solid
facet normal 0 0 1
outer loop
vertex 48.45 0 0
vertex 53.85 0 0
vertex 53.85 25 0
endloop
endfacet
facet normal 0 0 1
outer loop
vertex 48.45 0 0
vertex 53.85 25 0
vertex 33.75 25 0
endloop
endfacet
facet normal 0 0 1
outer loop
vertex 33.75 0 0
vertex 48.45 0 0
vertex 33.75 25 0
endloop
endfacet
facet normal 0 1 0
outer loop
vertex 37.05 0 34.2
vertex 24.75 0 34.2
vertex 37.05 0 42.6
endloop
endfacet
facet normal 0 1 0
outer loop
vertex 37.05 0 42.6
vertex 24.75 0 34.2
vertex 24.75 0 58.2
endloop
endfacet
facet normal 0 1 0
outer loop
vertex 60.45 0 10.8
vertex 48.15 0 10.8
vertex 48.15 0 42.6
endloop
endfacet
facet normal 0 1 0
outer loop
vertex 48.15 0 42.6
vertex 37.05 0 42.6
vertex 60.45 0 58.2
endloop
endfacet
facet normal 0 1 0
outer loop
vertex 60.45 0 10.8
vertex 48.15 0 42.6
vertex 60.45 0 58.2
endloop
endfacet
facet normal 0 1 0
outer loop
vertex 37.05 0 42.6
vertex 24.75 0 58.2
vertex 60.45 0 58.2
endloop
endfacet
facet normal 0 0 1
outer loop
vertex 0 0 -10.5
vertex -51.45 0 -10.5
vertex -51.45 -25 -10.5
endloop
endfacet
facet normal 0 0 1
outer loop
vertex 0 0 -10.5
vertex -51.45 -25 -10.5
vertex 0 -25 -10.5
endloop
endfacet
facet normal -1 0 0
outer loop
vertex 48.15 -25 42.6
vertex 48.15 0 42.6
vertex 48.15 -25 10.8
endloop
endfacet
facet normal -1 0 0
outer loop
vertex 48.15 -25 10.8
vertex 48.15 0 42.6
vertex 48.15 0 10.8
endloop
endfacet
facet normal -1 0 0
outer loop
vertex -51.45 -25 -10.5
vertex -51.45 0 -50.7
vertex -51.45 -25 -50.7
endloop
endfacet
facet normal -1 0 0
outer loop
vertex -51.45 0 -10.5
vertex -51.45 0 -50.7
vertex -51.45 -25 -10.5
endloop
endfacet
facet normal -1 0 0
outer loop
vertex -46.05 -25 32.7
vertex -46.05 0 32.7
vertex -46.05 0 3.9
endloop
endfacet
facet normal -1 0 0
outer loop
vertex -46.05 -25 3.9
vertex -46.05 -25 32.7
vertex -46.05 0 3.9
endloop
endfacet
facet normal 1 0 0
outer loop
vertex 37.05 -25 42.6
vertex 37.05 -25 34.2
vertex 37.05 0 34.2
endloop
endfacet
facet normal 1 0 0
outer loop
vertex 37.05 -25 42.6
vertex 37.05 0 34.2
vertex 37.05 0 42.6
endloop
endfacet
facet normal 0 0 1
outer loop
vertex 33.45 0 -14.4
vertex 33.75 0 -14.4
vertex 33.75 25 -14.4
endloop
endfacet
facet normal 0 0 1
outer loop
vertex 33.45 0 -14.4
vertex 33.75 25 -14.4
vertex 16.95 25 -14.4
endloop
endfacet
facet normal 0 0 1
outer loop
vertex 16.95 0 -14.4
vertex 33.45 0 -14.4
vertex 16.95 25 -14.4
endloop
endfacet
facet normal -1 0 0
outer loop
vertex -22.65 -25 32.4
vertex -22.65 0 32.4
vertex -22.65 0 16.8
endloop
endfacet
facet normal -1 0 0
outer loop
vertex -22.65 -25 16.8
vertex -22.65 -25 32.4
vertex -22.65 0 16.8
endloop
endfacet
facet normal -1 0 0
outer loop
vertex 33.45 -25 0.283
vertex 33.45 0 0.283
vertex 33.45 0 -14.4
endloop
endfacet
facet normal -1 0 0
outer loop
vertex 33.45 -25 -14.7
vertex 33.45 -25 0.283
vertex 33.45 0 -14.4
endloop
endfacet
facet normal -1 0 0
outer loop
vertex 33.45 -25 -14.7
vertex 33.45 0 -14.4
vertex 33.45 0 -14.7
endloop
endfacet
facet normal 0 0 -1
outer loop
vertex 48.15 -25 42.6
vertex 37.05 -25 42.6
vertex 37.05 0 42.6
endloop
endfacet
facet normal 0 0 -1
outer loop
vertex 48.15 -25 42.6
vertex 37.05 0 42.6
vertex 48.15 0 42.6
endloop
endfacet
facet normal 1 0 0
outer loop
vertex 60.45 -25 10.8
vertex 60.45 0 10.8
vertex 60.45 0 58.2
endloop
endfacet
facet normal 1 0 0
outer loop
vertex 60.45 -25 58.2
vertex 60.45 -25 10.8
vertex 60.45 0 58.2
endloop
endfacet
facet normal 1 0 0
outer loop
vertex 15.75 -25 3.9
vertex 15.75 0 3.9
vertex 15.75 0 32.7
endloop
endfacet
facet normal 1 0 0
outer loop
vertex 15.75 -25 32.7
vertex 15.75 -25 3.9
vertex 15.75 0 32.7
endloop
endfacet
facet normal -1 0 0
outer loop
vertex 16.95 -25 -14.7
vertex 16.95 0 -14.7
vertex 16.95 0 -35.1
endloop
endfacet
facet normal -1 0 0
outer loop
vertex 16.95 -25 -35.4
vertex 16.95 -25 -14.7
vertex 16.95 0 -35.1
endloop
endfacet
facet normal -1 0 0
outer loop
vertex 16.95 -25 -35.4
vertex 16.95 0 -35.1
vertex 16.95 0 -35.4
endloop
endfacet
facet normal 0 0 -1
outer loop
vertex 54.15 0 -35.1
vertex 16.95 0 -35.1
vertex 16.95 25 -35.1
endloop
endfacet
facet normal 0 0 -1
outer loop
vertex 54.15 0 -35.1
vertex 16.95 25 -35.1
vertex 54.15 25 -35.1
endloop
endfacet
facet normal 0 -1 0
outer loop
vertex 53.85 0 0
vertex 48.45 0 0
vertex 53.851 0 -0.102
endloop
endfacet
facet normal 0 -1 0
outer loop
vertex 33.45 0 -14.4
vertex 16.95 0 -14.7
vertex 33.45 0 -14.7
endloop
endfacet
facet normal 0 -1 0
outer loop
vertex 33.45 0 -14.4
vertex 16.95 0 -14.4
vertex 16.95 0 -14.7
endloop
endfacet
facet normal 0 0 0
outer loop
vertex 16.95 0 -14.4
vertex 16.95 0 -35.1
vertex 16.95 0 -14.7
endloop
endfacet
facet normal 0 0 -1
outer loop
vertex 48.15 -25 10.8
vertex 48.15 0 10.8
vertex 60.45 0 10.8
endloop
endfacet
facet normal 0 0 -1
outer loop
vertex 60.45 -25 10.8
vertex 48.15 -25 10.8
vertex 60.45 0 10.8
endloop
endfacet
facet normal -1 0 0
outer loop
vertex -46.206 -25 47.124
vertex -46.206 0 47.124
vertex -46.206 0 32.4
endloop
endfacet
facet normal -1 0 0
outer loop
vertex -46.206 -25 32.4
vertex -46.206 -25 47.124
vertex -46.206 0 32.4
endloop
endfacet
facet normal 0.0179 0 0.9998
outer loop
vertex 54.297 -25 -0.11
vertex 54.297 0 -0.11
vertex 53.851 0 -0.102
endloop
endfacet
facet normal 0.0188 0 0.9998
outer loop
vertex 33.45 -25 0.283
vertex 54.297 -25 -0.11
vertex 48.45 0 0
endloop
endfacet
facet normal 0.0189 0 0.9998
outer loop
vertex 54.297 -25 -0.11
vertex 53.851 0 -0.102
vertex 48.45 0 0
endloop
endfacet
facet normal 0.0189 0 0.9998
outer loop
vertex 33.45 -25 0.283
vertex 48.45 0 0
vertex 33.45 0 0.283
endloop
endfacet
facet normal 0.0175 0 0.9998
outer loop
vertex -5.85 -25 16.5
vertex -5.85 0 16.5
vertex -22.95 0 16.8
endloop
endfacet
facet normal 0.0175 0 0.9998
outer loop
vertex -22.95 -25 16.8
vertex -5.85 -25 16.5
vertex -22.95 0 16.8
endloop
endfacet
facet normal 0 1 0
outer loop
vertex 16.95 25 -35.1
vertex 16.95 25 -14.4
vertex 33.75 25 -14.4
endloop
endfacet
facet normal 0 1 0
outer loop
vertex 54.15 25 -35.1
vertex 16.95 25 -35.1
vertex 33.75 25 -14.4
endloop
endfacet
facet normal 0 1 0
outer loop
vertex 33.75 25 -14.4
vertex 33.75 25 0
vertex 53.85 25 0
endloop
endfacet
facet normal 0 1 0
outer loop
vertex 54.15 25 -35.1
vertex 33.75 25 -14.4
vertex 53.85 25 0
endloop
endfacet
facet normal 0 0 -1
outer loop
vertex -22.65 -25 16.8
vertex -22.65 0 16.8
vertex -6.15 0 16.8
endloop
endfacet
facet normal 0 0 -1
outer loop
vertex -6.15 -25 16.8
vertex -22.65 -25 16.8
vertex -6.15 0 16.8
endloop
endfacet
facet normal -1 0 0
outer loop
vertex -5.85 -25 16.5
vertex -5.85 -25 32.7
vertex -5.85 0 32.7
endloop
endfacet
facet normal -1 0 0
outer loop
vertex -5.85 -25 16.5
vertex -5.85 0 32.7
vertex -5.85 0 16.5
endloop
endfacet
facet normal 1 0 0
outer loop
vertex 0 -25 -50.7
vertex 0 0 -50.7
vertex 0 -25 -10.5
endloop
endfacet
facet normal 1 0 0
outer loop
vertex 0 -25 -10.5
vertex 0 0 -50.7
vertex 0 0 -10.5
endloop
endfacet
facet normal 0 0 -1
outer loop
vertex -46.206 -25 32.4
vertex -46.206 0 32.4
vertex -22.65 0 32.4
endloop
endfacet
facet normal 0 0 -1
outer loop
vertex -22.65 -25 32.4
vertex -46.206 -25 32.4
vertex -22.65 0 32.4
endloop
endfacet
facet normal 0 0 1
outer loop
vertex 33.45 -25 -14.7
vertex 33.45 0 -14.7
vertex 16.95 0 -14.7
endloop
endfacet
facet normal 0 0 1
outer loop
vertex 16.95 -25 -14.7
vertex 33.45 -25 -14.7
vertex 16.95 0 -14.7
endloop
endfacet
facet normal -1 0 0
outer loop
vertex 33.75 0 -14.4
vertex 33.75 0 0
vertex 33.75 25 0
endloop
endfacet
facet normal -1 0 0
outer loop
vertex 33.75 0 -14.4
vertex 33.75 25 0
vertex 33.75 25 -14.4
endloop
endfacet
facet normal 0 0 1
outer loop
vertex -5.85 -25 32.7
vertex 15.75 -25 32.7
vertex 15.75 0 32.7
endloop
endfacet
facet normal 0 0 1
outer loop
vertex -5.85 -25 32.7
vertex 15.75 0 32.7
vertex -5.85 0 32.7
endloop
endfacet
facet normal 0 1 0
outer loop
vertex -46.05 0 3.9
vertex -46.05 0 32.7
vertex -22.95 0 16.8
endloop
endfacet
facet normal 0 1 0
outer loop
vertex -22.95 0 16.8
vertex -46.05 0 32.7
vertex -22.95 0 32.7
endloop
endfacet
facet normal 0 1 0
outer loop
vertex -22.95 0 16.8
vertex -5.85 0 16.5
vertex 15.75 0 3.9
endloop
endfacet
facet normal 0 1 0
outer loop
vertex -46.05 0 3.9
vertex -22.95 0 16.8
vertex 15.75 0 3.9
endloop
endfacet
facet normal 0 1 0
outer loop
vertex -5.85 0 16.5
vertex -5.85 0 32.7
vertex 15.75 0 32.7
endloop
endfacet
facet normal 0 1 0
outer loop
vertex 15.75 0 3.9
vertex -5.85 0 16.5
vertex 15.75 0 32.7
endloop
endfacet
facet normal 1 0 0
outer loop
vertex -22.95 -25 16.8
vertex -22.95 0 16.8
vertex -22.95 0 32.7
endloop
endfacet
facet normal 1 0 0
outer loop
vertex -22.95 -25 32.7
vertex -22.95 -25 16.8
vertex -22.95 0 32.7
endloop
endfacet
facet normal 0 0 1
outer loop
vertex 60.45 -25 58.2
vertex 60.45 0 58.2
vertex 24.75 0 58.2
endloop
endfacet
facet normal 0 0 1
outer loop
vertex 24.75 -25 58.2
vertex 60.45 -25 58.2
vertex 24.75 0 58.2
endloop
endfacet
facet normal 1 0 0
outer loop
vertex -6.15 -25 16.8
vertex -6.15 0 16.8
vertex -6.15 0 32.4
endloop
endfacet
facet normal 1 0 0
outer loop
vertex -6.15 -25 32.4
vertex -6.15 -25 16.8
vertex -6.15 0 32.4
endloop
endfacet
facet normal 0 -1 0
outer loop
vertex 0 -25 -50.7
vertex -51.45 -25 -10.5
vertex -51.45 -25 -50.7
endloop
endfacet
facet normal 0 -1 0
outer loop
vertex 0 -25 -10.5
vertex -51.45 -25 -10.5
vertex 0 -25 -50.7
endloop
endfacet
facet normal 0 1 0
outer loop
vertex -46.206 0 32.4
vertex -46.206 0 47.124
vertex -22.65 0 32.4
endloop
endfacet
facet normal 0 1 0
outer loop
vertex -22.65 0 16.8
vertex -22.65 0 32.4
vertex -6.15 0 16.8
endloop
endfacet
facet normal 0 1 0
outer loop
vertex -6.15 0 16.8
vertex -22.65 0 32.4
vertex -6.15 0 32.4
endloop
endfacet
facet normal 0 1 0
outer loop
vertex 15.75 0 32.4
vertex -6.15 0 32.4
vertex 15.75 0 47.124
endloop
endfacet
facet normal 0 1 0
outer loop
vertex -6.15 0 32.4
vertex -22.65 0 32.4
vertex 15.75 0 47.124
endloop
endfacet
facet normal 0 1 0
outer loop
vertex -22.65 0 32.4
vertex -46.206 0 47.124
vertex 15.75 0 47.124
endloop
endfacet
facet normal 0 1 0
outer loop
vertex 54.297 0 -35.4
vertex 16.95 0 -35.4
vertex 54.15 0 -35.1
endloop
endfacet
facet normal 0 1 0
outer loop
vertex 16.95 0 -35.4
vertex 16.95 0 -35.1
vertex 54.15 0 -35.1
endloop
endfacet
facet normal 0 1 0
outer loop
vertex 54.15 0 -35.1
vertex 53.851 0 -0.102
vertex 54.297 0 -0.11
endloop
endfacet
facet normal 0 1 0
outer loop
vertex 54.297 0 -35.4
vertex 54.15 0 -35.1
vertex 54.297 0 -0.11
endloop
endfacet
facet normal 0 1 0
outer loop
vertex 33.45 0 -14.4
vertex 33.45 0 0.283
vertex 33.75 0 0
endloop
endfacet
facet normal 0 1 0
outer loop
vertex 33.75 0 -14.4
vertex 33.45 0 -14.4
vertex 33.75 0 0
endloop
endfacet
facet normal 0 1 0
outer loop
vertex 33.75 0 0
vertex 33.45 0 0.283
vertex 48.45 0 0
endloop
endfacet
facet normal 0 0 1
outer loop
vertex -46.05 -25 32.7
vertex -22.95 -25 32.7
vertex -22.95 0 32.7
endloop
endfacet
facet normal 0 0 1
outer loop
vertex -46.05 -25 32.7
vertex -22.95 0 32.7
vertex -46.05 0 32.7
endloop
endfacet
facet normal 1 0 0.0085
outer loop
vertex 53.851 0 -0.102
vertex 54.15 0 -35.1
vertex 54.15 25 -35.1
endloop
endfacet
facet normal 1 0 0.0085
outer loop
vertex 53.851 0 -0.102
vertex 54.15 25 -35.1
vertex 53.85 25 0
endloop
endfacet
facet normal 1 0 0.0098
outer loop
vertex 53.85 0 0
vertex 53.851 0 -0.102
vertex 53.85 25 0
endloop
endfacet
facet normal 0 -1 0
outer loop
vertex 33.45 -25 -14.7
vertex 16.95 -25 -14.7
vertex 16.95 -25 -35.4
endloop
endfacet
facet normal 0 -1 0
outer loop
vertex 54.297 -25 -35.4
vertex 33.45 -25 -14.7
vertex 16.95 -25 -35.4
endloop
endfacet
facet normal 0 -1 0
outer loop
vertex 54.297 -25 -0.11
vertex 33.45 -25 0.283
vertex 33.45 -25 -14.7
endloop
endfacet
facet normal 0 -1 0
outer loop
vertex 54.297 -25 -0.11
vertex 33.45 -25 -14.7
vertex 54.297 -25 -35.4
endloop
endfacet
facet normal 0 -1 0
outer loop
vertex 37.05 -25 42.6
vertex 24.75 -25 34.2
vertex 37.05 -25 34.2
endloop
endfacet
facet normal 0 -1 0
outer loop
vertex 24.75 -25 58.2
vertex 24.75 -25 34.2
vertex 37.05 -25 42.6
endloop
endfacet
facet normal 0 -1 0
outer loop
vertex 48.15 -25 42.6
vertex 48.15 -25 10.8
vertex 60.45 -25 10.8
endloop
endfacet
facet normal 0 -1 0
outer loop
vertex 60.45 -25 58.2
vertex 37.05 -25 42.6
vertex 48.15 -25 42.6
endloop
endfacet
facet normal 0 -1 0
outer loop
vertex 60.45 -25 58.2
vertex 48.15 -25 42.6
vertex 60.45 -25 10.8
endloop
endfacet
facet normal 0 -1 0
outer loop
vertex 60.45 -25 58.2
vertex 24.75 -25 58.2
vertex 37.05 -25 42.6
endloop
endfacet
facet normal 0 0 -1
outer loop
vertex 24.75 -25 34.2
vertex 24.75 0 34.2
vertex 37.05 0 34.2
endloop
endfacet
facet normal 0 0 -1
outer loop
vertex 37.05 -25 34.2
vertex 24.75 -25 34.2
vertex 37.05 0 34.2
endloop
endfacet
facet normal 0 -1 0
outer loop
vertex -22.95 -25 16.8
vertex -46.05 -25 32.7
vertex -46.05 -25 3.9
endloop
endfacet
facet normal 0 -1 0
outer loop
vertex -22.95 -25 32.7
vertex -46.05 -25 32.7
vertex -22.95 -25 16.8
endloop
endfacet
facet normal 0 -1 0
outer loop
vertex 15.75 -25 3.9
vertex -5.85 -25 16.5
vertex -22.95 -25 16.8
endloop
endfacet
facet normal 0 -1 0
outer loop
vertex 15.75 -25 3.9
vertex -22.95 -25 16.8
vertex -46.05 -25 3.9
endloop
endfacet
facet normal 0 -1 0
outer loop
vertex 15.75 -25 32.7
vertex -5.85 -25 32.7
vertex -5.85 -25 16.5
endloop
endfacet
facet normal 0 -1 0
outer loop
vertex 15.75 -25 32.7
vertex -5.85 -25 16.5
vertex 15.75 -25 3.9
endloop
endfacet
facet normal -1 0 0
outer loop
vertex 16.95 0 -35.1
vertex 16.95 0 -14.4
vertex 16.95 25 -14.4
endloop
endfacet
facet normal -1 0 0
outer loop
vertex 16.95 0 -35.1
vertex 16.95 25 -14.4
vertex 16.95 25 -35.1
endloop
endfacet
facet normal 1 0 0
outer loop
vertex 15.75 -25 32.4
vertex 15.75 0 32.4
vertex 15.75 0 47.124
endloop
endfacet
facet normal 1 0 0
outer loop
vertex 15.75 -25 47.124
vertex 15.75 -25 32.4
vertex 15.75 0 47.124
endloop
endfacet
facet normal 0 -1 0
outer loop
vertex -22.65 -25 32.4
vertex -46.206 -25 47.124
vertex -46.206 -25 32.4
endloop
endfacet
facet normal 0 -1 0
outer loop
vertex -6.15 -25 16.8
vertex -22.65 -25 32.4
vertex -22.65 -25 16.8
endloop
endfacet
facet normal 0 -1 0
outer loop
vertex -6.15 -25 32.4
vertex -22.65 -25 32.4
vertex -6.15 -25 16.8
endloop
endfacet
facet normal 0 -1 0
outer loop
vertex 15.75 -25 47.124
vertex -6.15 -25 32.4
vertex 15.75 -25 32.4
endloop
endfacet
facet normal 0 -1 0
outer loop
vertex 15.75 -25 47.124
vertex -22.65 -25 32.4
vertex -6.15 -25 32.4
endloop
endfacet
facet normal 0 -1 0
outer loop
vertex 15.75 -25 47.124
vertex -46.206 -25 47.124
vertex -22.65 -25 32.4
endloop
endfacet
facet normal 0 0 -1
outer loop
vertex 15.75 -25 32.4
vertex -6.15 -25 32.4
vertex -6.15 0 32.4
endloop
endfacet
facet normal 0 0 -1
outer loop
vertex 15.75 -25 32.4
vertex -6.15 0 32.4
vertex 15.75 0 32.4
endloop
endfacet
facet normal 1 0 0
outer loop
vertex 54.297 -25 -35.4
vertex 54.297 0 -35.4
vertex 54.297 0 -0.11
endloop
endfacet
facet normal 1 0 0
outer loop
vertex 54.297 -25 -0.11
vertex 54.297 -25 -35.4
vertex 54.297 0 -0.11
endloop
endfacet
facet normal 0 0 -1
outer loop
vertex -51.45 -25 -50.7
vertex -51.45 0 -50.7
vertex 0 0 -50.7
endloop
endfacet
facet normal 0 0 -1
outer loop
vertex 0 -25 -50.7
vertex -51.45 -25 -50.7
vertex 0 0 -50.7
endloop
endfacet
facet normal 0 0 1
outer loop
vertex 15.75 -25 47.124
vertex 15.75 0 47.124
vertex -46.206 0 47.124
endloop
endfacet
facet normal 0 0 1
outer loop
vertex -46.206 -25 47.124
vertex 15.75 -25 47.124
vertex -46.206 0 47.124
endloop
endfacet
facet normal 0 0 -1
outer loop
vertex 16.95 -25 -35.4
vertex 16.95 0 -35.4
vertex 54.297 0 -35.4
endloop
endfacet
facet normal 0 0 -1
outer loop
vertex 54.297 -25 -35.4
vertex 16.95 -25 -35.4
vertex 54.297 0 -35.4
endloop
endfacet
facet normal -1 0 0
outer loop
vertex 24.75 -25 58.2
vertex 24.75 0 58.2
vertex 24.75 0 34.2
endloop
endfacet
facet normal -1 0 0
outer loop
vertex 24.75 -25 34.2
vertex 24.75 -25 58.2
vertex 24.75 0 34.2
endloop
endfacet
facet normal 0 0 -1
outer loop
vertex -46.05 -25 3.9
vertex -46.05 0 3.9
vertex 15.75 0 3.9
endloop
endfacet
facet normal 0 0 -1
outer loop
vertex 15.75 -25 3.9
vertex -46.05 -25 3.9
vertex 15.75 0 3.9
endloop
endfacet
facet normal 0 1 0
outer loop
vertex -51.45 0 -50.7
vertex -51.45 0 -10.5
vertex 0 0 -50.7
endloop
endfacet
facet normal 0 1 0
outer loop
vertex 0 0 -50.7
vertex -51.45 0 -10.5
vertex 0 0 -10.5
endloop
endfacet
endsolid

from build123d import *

# Parameters (mm, degrees)
F1_DEPTH  = 25
F3_DEPTH  = 25
F4_W      = 51.450003
F4_H      = 40.2
F5_DEPTH  = 25
F7_DEPTH  = 25
F8_DEPTH  = 25
F10_DEPTH = 25
F12_DEPTH = 25


with BuildPart() as f1:
    # F0 (on Front) → F1 (new body)
    with BuildSketch(Plane.XZ):
        Polygon((-30.749999, 32.699998), (-46.050005, 32.699998), (-46.050005, 3.9), (15.75, 3.9), (15.75, 32.699998), (-5.850002, 32.699998), (-5.850002, 16.500002), (-22.950001, 16.800001), (-22.950001, 32.699998), align=None)
    extrude(amount=F1_DEPTH)


with BuildPart() as f3:
    # F2 (on Front) → F3 (new body)
    with BuildSketch(Plane.XZ):
        Polygon((-22.650002, 32.400001), (-22.650002, 16.800001), (-6.150001, 16.800001), (-6.150001, 32.400001), (15.75, 32.400001), (15.75, 47.124289), (-46.206031, 47.124289), (-46.206031, 32.400001), align=None)
    extrude(amount=F3_DEPTH)


with BuildPart() as f5:
    # F4 (on Front) → F5 (new body)
    with BuildSketch(Plane.XZ):
        with Locations((-25.725001, -30.600001)):
            Rectangle(F4_W, F4_H)
    extrude(amount=F5_DEPTH)


with BuildPart() as f7:
    # F6 (on Front) → F7 (new body)
    with BuildSketch(Plane.XZ):
        Polygon((54.296691, -35.399999), (54.296691, -0.110316), (33.45, 0.283018), (33.45, -14.700001), (16.950002, -14.700001), (16.950002, -35.399999), align=None)
    extrude(amount=F7_DEPTH)

    # F6 (on Front) → F8 (join)
    with BuildSketch(Plane.XZ):
        Polygon((54.296691, -35.399999), (54.296691, -0.110316), (33.45, 0.283018), (33.45, -14.700001), (16.950002, -14.700001), (16.950002, -35.399999), align=None)
    extrude(amount=F8_DEPTH)

    # F9 (on Front) → F10 (join)
    with BuildSketch(Plane.XZ):
        Polygon((54.150004, -35.100002), (53.850003, 0), (33.750001, 0), (33.750001, -14.400001), (16.95, -14.400001), (16.95, -35.100002), align=None)
    extrude(amount=-F10_DEPTH)


with BuildPart() as f12:
    # F11 (on Front) → F12 (new body)
    with BuildSketch(Plane.XZ):
        Polygon((24.75, 58.200005), (24.75, 34.200002), (37.050005, 34.200002), (37.050005, 42.600002), (48.150003, 42.600002), (48.150003, 10.8), (60.450006, 10.8), (60.450006, 58.200005), align=None)
    extrude(amount=F12_DEPTH)


solid = Compound([f1.part, f3.part, f5.part, f7.part, f12.part])
